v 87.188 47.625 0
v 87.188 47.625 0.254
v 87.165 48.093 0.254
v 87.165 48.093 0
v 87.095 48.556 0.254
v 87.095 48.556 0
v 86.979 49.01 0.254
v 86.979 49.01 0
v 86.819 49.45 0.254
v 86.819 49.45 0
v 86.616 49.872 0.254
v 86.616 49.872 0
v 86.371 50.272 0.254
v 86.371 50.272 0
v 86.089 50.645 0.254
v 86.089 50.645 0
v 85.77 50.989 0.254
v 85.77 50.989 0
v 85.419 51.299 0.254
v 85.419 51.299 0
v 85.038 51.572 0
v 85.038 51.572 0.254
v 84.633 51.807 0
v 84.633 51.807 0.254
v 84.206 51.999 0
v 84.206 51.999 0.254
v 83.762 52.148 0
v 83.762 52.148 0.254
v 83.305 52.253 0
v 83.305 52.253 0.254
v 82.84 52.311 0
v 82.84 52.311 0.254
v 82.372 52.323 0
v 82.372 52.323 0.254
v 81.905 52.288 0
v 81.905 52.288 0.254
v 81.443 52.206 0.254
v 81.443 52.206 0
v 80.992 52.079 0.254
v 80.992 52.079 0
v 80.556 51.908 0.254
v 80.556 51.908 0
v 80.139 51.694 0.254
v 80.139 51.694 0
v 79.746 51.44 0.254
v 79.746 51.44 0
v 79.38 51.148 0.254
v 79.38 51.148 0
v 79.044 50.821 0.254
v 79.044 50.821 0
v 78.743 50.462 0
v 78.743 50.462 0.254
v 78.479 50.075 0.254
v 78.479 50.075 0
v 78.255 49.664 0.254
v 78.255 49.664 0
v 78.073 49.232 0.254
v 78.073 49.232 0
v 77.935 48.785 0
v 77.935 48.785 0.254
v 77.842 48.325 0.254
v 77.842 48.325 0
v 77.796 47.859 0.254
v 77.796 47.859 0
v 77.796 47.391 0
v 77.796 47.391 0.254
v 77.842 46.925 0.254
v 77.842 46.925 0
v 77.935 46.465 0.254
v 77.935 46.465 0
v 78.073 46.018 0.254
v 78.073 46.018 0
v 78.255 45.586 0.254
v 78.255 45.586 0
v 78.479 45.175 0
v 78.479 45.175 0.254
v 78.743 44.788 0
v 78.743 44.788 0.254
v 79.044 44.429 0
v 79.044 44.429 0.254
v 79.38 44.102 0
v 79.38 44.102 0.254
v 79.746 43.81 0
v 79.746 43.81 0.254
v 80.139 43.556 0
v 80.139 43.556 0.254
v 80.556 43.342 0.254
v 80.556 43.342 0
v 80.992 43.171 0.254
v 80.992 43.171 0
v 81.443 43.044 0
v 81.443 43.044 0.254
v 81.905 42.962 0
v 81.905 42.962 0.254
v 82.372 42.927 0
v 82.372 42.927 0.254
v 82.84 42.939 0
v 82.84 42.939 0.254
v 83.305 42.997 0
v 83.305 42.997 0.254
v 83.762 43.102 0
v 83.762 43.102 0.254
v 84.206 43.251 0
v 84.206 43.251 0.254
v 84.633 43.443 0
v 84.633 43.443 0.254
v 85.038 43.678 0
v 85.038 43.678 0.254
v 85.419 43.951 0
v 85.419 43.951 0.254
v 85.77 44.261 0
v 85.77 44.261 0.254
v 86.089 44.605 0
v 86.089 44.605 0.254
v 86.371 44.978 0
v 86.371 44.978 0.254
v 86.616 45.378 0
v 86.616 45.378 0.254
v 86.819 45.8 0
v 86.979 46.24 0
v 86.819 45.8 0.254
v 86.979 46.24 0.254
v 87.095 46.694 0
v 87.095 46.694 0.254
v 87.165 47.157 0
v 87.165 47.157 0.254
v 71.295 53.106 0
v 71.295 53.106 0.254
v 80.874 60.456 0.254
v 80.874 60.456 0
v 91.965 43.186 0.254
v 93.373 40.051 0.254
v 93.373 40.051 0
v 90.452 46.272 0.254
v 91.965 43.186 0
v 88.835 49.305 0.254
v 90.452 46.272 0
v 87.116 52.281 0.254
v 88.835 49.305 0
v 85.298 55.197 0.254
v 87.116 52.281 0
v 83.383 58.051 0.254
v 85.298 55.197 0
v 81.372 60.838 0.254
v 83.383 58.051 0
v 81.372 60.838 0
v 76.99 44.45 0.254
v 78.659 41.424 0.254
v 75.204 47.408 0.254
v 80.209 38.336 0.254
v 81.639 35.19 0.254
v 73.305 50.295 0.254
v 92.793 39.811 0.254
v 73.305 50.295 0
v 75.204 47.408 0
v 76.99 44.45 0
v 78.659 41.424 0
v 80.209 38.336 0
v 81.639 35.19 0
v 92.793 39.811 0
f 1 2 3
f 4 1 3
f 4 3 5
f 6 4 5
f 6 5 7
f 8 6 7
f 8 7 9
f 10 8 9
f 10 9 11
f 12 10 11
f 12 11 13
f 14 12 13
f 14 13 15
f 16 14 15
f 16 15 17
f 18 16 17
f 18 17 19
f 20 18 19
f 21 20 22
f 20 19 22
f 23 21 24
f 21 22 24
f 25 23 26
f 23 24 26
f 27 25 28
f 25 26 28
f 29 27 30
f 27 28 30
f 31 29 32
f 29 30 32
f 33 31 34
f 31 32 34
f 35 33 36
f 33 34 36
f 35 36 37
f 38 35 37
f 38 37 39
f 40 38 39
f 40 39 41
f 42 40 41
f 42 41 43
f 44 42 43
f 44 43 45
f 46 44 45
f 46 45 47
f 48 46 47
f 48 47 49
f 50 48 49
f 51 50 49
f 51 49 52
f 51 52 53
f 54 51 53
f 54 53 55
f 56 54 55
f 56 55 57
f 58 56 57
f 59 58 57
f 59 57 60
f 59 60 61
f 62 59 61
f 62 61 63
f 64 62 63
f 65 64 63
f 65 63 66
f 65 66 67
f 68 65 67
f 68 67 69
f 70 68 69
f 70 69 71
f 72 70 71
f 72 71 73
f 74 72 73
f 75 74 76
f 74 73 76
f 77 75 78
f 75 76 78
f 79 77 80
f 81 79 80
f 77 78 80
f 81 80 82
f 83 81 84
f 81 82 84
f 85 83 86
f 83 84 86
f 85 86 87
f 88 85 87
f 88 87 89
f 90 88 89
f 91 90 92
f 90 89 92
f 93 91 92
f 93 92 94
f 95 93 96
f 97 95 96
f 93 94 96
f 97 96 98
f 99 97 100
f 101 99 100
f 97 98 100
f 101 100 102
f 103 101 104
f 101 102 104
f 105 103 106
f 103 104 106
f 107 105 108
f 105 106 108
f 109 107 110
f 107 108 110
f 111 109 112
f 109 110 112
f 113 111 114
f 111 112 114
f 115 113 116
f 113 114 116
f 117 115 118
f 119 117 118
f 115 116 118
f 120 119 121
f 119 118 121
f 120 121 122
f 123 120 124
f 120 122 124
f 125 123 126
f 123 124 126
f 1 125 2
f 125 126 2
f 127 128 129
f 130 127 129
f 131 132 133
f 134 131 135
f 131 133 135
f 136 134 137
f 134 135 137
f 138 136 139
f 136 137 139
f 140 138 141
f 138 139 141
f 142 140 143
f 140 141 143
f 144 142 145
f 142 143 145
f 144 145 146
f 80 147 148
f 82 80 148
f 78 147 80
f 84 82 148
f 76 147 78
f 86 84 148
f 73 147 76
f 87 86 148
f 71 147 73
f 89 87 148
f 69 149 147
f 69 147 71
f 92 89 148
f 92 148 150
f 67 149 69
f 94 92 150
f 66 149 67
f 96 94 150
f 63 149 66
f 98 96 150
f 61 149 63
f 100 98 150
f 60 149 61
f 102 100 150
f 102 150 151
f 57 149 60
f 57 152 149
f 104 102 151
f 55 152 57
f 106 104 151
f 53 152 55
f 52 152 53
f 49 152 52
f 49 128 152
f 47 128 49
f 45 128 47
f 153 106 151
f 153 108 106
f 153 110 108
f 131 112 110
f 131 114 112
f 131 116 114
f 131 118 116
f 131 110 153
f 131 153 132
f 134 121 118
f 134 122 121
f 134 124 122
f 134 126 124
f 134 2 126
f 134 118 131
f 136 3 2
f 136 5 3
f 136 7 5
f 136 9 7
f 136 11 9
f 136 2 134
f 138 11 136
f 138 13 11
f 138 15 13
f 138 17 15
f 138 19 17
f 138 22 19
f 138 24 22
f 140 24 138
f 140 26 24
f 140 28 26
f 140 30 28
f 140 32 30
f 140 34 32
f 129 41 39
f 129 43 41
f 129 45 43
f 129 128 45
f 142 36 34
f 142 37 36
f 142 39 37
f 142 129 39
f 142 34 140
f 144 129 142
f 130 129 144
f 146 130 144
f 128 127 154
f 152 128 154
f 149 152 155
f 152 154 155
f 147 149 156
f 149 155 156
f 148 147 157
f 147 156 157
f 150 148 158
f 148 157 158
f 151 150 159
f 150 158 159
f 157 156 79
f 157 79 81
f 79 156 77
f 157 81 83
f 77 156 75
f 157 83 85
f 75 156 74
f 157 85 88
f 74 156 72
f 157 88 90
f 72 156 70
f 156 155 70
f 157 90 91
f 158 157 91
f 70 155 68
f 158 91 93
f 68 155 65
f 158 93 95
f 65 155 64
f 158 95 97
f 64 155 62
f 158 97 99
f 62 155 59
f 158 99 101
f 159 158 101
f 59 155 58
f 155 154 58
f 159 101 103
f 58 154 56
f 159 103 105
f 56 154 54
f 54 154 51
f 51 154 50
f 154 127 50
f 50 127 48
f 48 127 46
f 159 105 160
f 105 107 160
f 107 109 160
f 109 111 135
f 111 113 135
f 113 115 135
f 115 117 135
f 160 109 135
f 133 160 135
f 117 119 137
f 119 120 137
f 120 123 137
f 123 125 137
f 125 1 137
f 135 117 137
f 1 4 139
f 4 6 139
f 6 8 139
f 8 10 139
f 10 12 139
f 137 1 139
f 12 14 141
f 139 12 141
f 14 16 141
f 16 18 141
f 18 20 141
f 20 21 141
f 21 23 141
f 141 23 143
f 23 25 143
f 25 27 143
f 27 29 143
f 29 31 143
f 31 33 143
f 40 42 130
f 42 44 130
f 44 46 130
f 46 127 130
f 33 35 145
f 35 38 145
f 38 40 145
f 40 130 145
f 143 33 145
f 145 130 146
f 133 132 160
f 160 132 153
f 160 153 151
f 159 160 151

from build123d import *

# Parameters (mm, degrees)
BOSS_EXTRUDE1_DEPTH = 0.254
SKETCH2_R           = 4.699
CUT_EXTRUDE1_DEPTH  = 1.254
SKETCH3_W           = 2.54
SKETCH3_H           = 0.635
CUT_EXTRUDE2_DEPTH  = 1.254
SKETCH5_OUTSIDE_W   = 121.447
SKETCH5_OUTSIDE_H   = 109.618
CUT_EXTRUDE5_DEPTH  = 1.254


with BuildPart() as part:
    # Sketch1 → Boss-Extrude1 (new body)
    with BuildSketch(Plane.XY):
        with BuildLine():
            Line((67.21146711, 76.191723231), (8.696654013, 17.676910134))
            Line((8.696654013, 17.676910134), (7.228954972, 14.133571205))
            ThreePointArc((7.228954972, 14.133571205), (14.666587579, 6.075099489), (15.105587123, -4.88230096))
            Line((15.105587123, -4.88230096), (18.648926052, -6.35))
            Line((18.648926052, -6.35), (101.401368334, -6.35))
            ThreePointArc((101.401368334, -6.35), (93.866160503, 38.880636728), (67.21146711, 76.191723231))
        make_face()
        with BuildLine():
            Line((88.672924278, 6.35), (27.86051193, 6.35))
            ThreePointArc((27.86051193, 6.35), (26.399857642, 10.93517908), (24.190484974, 15.210228852))
            Line((24.190484974, 15.210228852), (67.191354125, 58.211098004))
            ThreePointArc((67.191354125, 58.211098004), (82.13289044, 34.020557137), (88.672924278, 6.35))
        make_face(mode=Mode.SUBTRACT)
    extrude(amount=BOSS_EXTRUDE1_DEPTH)

    # Sketch2 → Cut-Extrude1 (cut, through all)
    with BuildSketch(Plane.XY.offset(0.254)):
        with Locations((22.225, 0)):
            Circle(SKETCH2_R)
        with Locations((36.195, 0)):
            Circle(SKETCH2_R)
        with Locations((61.722, 0)):
            Circle(SKETCH2_R)
        with Locations((75.692, 0)):
            Circle(SKETCH2_R)
        with Locations((95.25, 0)):
            Circle(SKETCH2_R)
        with Locations((15.715448212, 15.715448212)):
            Circle(SKETCH2_R)
        with Locations((25.593729945, 25.593729945)):
            Circle(SKETCH2_R)
        with Locations((43.644044748, 43.644044748)):
            Circle(SKETCH2_R)
        with Locations((53.522326482, 53.522326482)):
            Circle(SKETCH2_R)
        with Locations((92.004434954, 24.652514046)):
            Circle(SKETCH2_R)
        with Locations((82.48891971, 47.625)):
            Circle(SKETCH2_R)
        with Locations((67.351920908, 67.351920908)):
            Circle(SKETCH2_R)
    extrude(amount=-CUT_EXTRUDE1_DEPTH, mode=Mode.SUBTRACT)

    # Sketch3 → Cut-Extrude2 (cut, through all)
    with BuildSketch(Plane.XY.offset(0.254)):
        Polygon((15.266435406, 24.246691527), (17.06248663, 26.042742751), (17.511499436, 25.593729945), (15.715448212, 23.797678721), align=None)
        Polygon((44.991083167, 53.971339288), (43.195031942, 52.175288063), (43.644044748, 51.726275257), (45.440095973, 53.522326482), align=None)
        with Locations((29.21, -6.0325)):
            Rectangle(SKETCH3_W, SKETCH3_H)
        with Locations((68.707, -6.0325)):
            Rectangle(SKETCH3_W, SKETCH3_H)
        Polygon((29.230733674, 38.210989795), (31.026784898, 40.007041019), (31.475797704, 39.558028213), (29.67974648, 37.761976989), align=None)
        Polygon((56.845021246, 65.825277367), (55.048970022, 64.029226143), (55.497982828, 63.580213337), (57.294034052, 65.376264561), align=None)
        with Locations((48.9585, -6.0325)):
            Rectangle(SKETCH3_W, SKETCH3_H)
        with Locations((85.471, -6.0325)):
            Rectangle(SKETCH3_W, SKETCH3_H)
        Polygon((99.935462164, 14.437711971), (100.266998693, 11.919442024), (101.526133667, 12.085210288), (101.194597138, 14.603480236), align=None)
        Polygon((93.765504959, 37.464305742), (94.938831965, 37.950313702), (93.966816047, 40.296967714), (92.793489041, 39.810959755), align=None)
        Polygon((79.327792988, 62.471156422), (80.874047017, 60.456038938), (81.88160576, 61.229165953), (80.33535173, 63.244283437), align=None)
        Polygon((13.593916116, 7.005422516), (14.565932035, 4.658768503), (15.739259041, 5.144776462), (14.767243123, 7.491430475), align=None)
    extrude(amount=-CUT_EXTRUDE2_DEPTH, mode=Mode.SUBTRACT)

    # Sketch5 outside → Cut-Extrude5 (cut, through all)
    with BuildSketch(Plane.XY.offset(0.254)):
        with Locations((54.4145, 34.921)):
            Rectangle(SKETCH5_OUTSIDE_W, SKETCH5_OUTSIDE_H)
        with BuildLine():
            Line((70.287378691, 52.332602618), (82.379165395, 61.610956889))
            ThreePointArc((82.379165395, 61.610956889), (89.088033287, 51.435), (94.546236515, 40.53697153))
            Line((94.546236515, 40.53697153), (80.465052659, 34.704354203))
            ThreePointArc((80.465052659, 34.704354203), (75.889806134, 43.815), (70.287378691, 52.332602618))
        make_face(mode=Mode.SUBTRACT)
    extrude(amount=-CUT_EXTRUDE5_DEPTH, mode=Mode.SUBTRACT)


solid = part.part
